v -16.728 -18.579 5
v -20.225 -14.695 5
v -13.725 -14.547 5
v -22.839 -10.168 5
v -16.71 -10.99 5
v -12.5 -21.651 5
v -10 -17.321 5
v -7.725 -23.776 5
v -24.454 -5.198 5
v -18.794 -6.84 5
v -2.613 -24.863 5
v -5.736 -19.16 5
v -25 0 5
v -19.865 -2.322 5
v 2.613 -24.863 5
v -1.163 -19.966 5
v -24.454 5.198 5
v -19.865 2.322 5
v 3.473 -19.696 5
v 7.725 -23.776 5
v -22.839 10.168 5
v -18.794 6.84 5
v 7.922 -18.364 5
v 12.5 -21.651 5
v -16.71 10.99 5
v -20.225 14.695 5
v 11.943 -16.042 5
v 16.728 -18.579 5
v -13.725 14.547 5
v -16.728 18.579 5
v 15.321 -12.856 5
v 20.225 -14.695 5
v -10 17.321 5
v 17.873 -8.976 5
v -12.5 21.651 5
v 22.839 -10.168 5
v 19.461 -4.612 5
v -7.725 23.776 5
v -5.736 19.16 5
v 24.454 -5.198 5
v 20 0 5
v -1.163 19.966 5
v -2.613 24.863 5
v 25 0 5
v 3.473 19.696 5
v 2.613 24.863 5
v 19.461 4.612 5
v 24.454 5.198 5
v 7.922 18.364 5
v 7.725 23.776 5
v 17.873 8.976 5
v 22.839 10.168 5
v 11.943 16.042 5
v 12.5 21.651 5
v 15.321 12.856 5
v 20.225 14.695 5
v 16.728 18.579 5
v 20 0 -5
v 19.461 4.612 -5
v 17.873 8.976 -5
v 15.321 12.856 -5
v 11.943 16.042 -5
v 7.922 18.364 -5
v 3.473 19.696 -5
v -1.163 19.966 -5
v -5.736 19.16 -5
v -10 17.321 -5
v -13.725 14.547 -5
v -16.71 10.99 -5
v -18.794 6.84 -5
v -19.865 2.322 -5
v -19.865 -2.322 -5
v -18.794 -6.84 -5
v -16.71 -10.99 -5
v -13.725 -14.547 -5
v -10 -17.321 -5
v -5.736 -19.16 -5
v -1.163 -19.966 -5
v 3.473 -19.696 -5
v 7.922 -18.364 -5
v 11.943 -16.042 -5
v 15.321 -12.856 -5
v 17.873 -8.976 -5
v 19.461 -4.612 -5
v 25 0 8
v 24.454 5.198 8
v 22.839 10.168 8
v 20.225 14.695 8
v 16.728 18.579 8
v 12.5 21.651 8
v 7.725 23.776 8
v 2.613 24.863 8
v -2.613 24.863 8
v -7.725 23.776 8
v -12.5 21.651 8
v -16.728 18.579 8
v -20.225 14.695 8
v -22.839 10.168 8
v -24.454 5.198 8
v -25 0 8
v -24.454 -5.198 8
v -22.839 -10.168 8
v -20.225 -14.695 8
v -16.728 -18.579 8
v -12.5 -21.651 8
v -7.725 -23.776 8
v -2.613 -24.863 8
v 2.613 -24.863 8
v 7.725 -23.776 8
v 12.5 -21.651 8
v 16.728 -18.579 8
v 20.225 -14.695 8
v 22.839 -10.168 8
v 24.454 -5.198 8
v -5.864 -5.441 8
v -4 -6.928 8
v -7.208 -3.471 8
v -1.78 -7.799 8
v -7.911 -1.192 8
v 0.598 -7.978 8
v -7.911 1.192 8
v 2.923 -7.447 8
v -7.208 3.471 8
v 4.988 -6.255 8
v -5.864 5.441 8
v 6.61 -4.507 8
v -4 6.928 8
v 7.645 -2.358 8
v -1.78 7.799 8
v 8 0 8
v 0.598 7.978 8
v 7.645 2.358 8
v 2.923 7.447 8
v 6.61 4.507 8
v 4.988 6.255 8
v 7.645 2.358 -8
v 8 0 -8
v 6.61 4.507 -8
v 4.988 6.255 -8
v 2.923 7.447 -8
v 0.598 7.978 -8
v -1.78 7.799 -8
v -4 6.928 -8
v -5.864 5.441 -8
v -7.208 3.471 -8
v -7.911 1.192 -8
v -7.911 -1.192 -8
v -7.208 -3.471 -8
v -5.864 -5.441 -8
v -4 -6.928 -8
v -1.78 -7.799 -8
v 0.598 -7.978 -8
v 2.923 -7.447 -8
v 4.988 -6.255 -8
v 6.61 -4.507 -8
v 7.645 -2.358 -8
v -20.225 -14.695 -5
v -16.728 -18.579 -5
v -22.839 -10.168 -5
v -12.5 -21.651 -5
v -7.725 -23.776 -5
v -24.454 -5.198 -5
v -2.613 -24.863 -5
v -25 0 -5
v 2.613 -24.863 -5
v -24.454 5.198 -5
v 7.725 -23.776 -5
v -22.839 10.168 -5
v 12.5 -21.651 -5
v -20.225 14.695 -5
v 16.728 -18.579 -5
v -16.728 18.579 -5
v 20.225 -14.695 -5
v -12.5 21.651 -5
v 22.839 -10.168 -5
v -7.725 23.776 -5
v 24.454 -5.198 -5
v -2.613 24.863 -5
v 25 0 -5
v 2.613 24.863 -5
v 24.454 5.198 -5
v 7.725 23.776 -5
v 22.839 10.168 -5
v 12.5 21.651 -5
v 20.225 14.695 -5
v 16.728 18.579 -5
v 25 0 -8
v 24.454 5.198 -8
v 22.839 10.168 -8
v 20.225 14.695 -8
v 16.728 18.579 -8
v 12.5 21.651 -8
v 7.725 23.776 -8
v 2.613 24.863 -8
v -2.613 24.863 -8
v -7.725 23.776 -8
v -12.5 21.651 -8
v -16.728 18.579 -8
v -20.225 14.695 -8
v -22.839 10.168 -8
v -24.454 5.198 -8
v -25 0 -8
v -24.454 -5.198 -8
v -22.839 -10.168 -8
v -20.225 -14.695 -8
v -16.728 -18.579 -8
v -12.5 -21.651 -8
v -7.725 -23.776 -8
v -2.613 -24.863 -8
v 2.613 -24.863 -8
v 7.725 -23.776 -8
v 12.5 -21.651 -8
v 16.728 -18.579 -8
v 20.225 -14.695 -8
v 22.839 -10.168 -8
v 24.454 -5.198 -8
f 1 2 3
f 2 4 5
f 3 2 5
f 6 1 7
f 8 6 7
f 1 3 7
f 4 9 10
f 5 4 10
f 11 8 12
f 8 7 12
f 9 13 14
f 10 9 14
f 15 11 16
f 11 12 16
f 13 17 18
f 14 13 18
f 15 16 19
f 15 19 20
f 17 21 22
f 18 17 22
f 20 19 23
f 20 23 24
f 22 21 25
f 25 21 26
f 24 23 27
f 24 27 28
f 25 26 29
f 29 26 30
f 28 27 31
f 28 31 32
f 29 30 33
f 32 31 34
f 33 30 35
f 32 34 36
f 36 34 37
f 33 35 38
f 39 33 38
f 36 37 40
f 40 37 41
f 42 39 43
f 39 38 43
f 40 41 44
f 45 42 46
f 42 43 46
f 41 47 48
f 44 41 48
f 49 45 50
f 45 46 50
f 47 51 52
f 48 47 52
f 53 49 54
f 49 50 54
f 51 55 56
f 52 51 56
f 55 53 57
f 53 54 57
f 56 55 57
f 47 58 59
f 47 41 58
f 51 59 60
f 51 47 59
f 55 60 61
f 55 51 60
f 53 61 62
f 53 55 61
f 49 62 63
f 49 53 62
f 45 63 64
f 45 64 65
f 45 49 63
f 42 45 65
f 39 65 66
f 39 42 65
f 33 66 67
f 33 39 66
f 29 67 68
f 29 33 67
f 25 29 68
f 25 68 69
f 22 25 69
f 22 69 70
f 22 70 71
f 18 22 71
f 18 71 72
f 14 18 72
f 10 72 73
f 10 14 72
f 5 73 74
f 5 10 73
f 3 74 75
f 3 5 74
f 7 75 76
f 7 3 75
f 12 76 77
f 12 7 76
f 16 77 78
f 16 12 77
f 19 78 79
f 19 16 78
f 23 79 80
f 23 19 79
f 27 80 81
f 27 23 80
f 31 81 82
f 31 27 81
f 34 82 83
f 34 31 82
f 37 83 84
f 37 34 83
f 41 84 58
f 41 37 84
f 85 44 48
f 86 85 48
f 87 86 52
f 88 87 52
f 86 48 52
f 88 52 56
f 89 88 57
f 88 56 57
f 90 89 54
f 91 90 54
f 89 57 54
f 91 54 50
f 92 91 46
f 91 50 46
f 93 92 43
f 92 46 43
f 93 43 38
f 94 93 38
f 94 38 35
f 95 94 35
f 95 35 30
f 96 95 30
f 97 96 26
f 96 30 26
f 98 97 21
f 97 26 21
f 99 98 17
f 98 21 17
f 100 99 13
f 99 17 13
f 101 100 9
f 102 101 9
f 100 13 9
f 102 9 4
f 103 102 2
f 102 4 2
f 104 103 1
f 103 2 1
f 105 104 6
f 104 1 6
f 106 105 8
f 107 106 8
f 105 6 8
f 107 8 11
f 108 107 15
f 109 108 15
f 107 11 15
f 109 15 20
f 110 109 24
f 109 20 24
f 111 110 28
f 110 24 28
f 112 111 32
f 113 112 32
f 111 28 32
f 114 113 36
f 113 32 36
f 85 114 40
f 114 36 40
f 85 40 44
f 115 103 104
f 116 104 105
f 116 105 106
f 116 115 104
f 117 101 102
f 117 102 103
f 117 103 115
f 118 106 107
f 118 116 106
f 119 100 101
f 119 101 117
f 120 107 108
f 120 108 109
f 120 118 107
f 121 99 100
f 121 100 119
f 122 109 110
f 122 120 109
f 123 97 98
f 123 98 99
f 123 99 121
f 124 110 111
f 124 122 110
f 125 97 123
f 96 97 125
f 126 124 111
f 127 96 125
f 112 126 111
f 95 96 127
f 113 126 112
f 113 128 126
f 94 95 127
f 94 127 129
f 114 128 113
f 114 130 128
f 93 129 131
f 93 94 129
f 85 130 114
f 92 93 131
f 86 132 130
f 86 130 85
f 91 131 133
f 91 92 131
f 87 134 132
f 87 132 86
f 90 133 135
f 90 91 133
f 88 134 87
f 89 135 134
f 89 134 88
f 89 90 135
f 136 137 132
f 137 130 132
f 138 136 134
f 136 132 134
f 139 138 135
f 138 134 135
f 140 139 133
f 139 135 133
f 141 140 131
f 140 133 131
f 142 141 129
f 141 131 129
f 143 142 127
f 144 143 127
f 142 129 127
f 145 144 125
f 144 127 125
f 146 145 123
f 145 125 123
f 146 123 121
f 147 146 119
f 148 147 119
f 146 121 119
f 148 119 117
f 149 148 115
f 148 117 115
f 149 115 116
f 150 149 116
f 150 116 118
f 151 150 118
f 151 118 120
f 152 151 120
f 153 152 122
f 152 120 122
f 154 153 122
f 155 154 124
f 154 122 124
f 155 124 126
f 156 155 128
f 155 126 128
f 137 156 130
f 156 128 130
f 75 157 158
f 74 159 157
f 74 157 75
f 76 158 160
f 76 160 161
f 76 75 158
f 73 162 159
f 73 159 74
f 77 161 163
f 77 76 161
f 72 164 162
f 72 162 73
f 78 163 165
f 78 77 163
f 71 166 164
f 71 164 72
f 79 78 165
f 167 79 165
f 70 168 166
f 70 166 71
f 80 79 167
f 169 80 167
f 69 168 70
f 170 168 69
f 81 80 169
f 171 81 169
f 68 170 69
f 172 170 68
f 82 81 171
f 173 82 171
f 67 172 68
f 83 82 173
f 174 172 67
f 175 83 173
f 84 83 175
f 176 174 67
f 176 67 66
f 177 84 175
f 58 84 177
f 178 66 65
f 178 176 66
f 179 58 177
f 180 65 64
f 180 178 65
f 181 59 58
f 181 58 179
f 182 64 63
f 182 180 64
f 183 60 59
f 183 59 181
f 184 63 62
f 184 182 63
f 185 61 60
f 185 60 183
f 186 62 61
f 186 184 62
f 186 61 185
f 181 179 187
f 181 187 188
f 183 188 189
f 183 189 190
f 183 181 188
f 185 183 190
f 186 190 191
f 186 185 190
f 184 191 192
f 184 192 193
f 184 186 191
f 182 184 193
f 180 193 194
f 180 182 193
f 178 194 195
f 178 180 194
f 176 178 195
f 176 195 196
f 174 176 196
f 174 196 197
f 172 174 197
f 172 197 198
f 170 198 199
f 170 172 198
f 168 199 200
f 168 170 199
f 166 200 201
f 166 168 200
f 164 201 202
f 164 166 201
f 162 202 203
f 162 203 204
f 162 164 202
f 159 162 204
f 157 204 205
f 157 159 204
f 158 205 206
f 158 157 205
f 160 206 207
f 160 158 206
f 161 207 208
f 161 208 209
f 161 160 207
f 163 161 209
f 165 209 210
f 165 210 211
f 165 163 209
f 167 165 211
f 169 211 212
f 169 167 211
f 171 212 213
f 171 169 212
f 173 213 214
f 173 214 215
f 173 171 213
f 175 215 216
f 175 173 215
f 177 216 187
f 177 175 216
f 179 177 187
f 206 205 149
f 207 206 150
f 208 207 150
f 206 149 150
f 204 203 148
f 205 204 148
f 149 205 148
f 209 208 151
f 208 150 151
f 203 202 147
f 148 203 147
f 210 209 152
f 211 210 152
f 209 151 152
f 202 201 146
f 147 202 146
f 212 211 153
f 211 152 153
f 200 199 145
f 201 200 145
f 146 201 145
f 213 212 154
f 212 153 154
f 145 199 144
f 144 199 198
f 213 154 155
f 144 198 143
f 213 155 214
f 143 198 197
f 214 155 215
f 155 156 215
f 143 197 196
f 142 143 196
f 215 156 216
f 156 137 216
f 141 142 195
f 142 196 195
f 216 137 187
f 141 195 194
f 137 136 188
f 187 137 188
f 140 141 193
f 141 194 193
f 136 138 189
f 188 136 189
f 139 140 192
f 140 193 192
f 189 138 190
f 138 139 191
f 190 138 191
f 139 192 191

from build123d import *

# Parameters (mm, degrees)
CROQUIS1_R              = 20
CROQUIS1_R_2            = 8
SALIENTE_EXTRUIR1_DEPTH = 5
CROQUIS2_R              = 25
CROQUIS2_R_2            = 8
SALIENTE_EXTRUIR2_DEPTH = 3


with BuildPart() as part:
    # Croquis1 → Saliente-Extruir1 (new, symmetric)
    with BuildSketch(Plane.XY):
        Circle(CROQUIS1_R)
        Circle(CROQUIS1_R_2, mode=Mode.SUBTRACT)
    extrude(amount=SALIENTE_EXTRUIR1_DEPTH, both=True)

    # Croquis2 → Saliente-Extruir2 (add)
    with BuildSketch(Plane.XY.offset(5)):
        Circle(CROQUIS2_R)
        Circle(CROQUIS2_R_2, mode=Mode.SUBTRACT)
    saliente_extruir2 = extrude(amount=SALIENTE_EXTRUIR2_DEPTH)

    # Simetría1: Saliente-Extruir2 across plane
    add(saliente_extruir2.mirror(Plane.XY))


solid = part.part
